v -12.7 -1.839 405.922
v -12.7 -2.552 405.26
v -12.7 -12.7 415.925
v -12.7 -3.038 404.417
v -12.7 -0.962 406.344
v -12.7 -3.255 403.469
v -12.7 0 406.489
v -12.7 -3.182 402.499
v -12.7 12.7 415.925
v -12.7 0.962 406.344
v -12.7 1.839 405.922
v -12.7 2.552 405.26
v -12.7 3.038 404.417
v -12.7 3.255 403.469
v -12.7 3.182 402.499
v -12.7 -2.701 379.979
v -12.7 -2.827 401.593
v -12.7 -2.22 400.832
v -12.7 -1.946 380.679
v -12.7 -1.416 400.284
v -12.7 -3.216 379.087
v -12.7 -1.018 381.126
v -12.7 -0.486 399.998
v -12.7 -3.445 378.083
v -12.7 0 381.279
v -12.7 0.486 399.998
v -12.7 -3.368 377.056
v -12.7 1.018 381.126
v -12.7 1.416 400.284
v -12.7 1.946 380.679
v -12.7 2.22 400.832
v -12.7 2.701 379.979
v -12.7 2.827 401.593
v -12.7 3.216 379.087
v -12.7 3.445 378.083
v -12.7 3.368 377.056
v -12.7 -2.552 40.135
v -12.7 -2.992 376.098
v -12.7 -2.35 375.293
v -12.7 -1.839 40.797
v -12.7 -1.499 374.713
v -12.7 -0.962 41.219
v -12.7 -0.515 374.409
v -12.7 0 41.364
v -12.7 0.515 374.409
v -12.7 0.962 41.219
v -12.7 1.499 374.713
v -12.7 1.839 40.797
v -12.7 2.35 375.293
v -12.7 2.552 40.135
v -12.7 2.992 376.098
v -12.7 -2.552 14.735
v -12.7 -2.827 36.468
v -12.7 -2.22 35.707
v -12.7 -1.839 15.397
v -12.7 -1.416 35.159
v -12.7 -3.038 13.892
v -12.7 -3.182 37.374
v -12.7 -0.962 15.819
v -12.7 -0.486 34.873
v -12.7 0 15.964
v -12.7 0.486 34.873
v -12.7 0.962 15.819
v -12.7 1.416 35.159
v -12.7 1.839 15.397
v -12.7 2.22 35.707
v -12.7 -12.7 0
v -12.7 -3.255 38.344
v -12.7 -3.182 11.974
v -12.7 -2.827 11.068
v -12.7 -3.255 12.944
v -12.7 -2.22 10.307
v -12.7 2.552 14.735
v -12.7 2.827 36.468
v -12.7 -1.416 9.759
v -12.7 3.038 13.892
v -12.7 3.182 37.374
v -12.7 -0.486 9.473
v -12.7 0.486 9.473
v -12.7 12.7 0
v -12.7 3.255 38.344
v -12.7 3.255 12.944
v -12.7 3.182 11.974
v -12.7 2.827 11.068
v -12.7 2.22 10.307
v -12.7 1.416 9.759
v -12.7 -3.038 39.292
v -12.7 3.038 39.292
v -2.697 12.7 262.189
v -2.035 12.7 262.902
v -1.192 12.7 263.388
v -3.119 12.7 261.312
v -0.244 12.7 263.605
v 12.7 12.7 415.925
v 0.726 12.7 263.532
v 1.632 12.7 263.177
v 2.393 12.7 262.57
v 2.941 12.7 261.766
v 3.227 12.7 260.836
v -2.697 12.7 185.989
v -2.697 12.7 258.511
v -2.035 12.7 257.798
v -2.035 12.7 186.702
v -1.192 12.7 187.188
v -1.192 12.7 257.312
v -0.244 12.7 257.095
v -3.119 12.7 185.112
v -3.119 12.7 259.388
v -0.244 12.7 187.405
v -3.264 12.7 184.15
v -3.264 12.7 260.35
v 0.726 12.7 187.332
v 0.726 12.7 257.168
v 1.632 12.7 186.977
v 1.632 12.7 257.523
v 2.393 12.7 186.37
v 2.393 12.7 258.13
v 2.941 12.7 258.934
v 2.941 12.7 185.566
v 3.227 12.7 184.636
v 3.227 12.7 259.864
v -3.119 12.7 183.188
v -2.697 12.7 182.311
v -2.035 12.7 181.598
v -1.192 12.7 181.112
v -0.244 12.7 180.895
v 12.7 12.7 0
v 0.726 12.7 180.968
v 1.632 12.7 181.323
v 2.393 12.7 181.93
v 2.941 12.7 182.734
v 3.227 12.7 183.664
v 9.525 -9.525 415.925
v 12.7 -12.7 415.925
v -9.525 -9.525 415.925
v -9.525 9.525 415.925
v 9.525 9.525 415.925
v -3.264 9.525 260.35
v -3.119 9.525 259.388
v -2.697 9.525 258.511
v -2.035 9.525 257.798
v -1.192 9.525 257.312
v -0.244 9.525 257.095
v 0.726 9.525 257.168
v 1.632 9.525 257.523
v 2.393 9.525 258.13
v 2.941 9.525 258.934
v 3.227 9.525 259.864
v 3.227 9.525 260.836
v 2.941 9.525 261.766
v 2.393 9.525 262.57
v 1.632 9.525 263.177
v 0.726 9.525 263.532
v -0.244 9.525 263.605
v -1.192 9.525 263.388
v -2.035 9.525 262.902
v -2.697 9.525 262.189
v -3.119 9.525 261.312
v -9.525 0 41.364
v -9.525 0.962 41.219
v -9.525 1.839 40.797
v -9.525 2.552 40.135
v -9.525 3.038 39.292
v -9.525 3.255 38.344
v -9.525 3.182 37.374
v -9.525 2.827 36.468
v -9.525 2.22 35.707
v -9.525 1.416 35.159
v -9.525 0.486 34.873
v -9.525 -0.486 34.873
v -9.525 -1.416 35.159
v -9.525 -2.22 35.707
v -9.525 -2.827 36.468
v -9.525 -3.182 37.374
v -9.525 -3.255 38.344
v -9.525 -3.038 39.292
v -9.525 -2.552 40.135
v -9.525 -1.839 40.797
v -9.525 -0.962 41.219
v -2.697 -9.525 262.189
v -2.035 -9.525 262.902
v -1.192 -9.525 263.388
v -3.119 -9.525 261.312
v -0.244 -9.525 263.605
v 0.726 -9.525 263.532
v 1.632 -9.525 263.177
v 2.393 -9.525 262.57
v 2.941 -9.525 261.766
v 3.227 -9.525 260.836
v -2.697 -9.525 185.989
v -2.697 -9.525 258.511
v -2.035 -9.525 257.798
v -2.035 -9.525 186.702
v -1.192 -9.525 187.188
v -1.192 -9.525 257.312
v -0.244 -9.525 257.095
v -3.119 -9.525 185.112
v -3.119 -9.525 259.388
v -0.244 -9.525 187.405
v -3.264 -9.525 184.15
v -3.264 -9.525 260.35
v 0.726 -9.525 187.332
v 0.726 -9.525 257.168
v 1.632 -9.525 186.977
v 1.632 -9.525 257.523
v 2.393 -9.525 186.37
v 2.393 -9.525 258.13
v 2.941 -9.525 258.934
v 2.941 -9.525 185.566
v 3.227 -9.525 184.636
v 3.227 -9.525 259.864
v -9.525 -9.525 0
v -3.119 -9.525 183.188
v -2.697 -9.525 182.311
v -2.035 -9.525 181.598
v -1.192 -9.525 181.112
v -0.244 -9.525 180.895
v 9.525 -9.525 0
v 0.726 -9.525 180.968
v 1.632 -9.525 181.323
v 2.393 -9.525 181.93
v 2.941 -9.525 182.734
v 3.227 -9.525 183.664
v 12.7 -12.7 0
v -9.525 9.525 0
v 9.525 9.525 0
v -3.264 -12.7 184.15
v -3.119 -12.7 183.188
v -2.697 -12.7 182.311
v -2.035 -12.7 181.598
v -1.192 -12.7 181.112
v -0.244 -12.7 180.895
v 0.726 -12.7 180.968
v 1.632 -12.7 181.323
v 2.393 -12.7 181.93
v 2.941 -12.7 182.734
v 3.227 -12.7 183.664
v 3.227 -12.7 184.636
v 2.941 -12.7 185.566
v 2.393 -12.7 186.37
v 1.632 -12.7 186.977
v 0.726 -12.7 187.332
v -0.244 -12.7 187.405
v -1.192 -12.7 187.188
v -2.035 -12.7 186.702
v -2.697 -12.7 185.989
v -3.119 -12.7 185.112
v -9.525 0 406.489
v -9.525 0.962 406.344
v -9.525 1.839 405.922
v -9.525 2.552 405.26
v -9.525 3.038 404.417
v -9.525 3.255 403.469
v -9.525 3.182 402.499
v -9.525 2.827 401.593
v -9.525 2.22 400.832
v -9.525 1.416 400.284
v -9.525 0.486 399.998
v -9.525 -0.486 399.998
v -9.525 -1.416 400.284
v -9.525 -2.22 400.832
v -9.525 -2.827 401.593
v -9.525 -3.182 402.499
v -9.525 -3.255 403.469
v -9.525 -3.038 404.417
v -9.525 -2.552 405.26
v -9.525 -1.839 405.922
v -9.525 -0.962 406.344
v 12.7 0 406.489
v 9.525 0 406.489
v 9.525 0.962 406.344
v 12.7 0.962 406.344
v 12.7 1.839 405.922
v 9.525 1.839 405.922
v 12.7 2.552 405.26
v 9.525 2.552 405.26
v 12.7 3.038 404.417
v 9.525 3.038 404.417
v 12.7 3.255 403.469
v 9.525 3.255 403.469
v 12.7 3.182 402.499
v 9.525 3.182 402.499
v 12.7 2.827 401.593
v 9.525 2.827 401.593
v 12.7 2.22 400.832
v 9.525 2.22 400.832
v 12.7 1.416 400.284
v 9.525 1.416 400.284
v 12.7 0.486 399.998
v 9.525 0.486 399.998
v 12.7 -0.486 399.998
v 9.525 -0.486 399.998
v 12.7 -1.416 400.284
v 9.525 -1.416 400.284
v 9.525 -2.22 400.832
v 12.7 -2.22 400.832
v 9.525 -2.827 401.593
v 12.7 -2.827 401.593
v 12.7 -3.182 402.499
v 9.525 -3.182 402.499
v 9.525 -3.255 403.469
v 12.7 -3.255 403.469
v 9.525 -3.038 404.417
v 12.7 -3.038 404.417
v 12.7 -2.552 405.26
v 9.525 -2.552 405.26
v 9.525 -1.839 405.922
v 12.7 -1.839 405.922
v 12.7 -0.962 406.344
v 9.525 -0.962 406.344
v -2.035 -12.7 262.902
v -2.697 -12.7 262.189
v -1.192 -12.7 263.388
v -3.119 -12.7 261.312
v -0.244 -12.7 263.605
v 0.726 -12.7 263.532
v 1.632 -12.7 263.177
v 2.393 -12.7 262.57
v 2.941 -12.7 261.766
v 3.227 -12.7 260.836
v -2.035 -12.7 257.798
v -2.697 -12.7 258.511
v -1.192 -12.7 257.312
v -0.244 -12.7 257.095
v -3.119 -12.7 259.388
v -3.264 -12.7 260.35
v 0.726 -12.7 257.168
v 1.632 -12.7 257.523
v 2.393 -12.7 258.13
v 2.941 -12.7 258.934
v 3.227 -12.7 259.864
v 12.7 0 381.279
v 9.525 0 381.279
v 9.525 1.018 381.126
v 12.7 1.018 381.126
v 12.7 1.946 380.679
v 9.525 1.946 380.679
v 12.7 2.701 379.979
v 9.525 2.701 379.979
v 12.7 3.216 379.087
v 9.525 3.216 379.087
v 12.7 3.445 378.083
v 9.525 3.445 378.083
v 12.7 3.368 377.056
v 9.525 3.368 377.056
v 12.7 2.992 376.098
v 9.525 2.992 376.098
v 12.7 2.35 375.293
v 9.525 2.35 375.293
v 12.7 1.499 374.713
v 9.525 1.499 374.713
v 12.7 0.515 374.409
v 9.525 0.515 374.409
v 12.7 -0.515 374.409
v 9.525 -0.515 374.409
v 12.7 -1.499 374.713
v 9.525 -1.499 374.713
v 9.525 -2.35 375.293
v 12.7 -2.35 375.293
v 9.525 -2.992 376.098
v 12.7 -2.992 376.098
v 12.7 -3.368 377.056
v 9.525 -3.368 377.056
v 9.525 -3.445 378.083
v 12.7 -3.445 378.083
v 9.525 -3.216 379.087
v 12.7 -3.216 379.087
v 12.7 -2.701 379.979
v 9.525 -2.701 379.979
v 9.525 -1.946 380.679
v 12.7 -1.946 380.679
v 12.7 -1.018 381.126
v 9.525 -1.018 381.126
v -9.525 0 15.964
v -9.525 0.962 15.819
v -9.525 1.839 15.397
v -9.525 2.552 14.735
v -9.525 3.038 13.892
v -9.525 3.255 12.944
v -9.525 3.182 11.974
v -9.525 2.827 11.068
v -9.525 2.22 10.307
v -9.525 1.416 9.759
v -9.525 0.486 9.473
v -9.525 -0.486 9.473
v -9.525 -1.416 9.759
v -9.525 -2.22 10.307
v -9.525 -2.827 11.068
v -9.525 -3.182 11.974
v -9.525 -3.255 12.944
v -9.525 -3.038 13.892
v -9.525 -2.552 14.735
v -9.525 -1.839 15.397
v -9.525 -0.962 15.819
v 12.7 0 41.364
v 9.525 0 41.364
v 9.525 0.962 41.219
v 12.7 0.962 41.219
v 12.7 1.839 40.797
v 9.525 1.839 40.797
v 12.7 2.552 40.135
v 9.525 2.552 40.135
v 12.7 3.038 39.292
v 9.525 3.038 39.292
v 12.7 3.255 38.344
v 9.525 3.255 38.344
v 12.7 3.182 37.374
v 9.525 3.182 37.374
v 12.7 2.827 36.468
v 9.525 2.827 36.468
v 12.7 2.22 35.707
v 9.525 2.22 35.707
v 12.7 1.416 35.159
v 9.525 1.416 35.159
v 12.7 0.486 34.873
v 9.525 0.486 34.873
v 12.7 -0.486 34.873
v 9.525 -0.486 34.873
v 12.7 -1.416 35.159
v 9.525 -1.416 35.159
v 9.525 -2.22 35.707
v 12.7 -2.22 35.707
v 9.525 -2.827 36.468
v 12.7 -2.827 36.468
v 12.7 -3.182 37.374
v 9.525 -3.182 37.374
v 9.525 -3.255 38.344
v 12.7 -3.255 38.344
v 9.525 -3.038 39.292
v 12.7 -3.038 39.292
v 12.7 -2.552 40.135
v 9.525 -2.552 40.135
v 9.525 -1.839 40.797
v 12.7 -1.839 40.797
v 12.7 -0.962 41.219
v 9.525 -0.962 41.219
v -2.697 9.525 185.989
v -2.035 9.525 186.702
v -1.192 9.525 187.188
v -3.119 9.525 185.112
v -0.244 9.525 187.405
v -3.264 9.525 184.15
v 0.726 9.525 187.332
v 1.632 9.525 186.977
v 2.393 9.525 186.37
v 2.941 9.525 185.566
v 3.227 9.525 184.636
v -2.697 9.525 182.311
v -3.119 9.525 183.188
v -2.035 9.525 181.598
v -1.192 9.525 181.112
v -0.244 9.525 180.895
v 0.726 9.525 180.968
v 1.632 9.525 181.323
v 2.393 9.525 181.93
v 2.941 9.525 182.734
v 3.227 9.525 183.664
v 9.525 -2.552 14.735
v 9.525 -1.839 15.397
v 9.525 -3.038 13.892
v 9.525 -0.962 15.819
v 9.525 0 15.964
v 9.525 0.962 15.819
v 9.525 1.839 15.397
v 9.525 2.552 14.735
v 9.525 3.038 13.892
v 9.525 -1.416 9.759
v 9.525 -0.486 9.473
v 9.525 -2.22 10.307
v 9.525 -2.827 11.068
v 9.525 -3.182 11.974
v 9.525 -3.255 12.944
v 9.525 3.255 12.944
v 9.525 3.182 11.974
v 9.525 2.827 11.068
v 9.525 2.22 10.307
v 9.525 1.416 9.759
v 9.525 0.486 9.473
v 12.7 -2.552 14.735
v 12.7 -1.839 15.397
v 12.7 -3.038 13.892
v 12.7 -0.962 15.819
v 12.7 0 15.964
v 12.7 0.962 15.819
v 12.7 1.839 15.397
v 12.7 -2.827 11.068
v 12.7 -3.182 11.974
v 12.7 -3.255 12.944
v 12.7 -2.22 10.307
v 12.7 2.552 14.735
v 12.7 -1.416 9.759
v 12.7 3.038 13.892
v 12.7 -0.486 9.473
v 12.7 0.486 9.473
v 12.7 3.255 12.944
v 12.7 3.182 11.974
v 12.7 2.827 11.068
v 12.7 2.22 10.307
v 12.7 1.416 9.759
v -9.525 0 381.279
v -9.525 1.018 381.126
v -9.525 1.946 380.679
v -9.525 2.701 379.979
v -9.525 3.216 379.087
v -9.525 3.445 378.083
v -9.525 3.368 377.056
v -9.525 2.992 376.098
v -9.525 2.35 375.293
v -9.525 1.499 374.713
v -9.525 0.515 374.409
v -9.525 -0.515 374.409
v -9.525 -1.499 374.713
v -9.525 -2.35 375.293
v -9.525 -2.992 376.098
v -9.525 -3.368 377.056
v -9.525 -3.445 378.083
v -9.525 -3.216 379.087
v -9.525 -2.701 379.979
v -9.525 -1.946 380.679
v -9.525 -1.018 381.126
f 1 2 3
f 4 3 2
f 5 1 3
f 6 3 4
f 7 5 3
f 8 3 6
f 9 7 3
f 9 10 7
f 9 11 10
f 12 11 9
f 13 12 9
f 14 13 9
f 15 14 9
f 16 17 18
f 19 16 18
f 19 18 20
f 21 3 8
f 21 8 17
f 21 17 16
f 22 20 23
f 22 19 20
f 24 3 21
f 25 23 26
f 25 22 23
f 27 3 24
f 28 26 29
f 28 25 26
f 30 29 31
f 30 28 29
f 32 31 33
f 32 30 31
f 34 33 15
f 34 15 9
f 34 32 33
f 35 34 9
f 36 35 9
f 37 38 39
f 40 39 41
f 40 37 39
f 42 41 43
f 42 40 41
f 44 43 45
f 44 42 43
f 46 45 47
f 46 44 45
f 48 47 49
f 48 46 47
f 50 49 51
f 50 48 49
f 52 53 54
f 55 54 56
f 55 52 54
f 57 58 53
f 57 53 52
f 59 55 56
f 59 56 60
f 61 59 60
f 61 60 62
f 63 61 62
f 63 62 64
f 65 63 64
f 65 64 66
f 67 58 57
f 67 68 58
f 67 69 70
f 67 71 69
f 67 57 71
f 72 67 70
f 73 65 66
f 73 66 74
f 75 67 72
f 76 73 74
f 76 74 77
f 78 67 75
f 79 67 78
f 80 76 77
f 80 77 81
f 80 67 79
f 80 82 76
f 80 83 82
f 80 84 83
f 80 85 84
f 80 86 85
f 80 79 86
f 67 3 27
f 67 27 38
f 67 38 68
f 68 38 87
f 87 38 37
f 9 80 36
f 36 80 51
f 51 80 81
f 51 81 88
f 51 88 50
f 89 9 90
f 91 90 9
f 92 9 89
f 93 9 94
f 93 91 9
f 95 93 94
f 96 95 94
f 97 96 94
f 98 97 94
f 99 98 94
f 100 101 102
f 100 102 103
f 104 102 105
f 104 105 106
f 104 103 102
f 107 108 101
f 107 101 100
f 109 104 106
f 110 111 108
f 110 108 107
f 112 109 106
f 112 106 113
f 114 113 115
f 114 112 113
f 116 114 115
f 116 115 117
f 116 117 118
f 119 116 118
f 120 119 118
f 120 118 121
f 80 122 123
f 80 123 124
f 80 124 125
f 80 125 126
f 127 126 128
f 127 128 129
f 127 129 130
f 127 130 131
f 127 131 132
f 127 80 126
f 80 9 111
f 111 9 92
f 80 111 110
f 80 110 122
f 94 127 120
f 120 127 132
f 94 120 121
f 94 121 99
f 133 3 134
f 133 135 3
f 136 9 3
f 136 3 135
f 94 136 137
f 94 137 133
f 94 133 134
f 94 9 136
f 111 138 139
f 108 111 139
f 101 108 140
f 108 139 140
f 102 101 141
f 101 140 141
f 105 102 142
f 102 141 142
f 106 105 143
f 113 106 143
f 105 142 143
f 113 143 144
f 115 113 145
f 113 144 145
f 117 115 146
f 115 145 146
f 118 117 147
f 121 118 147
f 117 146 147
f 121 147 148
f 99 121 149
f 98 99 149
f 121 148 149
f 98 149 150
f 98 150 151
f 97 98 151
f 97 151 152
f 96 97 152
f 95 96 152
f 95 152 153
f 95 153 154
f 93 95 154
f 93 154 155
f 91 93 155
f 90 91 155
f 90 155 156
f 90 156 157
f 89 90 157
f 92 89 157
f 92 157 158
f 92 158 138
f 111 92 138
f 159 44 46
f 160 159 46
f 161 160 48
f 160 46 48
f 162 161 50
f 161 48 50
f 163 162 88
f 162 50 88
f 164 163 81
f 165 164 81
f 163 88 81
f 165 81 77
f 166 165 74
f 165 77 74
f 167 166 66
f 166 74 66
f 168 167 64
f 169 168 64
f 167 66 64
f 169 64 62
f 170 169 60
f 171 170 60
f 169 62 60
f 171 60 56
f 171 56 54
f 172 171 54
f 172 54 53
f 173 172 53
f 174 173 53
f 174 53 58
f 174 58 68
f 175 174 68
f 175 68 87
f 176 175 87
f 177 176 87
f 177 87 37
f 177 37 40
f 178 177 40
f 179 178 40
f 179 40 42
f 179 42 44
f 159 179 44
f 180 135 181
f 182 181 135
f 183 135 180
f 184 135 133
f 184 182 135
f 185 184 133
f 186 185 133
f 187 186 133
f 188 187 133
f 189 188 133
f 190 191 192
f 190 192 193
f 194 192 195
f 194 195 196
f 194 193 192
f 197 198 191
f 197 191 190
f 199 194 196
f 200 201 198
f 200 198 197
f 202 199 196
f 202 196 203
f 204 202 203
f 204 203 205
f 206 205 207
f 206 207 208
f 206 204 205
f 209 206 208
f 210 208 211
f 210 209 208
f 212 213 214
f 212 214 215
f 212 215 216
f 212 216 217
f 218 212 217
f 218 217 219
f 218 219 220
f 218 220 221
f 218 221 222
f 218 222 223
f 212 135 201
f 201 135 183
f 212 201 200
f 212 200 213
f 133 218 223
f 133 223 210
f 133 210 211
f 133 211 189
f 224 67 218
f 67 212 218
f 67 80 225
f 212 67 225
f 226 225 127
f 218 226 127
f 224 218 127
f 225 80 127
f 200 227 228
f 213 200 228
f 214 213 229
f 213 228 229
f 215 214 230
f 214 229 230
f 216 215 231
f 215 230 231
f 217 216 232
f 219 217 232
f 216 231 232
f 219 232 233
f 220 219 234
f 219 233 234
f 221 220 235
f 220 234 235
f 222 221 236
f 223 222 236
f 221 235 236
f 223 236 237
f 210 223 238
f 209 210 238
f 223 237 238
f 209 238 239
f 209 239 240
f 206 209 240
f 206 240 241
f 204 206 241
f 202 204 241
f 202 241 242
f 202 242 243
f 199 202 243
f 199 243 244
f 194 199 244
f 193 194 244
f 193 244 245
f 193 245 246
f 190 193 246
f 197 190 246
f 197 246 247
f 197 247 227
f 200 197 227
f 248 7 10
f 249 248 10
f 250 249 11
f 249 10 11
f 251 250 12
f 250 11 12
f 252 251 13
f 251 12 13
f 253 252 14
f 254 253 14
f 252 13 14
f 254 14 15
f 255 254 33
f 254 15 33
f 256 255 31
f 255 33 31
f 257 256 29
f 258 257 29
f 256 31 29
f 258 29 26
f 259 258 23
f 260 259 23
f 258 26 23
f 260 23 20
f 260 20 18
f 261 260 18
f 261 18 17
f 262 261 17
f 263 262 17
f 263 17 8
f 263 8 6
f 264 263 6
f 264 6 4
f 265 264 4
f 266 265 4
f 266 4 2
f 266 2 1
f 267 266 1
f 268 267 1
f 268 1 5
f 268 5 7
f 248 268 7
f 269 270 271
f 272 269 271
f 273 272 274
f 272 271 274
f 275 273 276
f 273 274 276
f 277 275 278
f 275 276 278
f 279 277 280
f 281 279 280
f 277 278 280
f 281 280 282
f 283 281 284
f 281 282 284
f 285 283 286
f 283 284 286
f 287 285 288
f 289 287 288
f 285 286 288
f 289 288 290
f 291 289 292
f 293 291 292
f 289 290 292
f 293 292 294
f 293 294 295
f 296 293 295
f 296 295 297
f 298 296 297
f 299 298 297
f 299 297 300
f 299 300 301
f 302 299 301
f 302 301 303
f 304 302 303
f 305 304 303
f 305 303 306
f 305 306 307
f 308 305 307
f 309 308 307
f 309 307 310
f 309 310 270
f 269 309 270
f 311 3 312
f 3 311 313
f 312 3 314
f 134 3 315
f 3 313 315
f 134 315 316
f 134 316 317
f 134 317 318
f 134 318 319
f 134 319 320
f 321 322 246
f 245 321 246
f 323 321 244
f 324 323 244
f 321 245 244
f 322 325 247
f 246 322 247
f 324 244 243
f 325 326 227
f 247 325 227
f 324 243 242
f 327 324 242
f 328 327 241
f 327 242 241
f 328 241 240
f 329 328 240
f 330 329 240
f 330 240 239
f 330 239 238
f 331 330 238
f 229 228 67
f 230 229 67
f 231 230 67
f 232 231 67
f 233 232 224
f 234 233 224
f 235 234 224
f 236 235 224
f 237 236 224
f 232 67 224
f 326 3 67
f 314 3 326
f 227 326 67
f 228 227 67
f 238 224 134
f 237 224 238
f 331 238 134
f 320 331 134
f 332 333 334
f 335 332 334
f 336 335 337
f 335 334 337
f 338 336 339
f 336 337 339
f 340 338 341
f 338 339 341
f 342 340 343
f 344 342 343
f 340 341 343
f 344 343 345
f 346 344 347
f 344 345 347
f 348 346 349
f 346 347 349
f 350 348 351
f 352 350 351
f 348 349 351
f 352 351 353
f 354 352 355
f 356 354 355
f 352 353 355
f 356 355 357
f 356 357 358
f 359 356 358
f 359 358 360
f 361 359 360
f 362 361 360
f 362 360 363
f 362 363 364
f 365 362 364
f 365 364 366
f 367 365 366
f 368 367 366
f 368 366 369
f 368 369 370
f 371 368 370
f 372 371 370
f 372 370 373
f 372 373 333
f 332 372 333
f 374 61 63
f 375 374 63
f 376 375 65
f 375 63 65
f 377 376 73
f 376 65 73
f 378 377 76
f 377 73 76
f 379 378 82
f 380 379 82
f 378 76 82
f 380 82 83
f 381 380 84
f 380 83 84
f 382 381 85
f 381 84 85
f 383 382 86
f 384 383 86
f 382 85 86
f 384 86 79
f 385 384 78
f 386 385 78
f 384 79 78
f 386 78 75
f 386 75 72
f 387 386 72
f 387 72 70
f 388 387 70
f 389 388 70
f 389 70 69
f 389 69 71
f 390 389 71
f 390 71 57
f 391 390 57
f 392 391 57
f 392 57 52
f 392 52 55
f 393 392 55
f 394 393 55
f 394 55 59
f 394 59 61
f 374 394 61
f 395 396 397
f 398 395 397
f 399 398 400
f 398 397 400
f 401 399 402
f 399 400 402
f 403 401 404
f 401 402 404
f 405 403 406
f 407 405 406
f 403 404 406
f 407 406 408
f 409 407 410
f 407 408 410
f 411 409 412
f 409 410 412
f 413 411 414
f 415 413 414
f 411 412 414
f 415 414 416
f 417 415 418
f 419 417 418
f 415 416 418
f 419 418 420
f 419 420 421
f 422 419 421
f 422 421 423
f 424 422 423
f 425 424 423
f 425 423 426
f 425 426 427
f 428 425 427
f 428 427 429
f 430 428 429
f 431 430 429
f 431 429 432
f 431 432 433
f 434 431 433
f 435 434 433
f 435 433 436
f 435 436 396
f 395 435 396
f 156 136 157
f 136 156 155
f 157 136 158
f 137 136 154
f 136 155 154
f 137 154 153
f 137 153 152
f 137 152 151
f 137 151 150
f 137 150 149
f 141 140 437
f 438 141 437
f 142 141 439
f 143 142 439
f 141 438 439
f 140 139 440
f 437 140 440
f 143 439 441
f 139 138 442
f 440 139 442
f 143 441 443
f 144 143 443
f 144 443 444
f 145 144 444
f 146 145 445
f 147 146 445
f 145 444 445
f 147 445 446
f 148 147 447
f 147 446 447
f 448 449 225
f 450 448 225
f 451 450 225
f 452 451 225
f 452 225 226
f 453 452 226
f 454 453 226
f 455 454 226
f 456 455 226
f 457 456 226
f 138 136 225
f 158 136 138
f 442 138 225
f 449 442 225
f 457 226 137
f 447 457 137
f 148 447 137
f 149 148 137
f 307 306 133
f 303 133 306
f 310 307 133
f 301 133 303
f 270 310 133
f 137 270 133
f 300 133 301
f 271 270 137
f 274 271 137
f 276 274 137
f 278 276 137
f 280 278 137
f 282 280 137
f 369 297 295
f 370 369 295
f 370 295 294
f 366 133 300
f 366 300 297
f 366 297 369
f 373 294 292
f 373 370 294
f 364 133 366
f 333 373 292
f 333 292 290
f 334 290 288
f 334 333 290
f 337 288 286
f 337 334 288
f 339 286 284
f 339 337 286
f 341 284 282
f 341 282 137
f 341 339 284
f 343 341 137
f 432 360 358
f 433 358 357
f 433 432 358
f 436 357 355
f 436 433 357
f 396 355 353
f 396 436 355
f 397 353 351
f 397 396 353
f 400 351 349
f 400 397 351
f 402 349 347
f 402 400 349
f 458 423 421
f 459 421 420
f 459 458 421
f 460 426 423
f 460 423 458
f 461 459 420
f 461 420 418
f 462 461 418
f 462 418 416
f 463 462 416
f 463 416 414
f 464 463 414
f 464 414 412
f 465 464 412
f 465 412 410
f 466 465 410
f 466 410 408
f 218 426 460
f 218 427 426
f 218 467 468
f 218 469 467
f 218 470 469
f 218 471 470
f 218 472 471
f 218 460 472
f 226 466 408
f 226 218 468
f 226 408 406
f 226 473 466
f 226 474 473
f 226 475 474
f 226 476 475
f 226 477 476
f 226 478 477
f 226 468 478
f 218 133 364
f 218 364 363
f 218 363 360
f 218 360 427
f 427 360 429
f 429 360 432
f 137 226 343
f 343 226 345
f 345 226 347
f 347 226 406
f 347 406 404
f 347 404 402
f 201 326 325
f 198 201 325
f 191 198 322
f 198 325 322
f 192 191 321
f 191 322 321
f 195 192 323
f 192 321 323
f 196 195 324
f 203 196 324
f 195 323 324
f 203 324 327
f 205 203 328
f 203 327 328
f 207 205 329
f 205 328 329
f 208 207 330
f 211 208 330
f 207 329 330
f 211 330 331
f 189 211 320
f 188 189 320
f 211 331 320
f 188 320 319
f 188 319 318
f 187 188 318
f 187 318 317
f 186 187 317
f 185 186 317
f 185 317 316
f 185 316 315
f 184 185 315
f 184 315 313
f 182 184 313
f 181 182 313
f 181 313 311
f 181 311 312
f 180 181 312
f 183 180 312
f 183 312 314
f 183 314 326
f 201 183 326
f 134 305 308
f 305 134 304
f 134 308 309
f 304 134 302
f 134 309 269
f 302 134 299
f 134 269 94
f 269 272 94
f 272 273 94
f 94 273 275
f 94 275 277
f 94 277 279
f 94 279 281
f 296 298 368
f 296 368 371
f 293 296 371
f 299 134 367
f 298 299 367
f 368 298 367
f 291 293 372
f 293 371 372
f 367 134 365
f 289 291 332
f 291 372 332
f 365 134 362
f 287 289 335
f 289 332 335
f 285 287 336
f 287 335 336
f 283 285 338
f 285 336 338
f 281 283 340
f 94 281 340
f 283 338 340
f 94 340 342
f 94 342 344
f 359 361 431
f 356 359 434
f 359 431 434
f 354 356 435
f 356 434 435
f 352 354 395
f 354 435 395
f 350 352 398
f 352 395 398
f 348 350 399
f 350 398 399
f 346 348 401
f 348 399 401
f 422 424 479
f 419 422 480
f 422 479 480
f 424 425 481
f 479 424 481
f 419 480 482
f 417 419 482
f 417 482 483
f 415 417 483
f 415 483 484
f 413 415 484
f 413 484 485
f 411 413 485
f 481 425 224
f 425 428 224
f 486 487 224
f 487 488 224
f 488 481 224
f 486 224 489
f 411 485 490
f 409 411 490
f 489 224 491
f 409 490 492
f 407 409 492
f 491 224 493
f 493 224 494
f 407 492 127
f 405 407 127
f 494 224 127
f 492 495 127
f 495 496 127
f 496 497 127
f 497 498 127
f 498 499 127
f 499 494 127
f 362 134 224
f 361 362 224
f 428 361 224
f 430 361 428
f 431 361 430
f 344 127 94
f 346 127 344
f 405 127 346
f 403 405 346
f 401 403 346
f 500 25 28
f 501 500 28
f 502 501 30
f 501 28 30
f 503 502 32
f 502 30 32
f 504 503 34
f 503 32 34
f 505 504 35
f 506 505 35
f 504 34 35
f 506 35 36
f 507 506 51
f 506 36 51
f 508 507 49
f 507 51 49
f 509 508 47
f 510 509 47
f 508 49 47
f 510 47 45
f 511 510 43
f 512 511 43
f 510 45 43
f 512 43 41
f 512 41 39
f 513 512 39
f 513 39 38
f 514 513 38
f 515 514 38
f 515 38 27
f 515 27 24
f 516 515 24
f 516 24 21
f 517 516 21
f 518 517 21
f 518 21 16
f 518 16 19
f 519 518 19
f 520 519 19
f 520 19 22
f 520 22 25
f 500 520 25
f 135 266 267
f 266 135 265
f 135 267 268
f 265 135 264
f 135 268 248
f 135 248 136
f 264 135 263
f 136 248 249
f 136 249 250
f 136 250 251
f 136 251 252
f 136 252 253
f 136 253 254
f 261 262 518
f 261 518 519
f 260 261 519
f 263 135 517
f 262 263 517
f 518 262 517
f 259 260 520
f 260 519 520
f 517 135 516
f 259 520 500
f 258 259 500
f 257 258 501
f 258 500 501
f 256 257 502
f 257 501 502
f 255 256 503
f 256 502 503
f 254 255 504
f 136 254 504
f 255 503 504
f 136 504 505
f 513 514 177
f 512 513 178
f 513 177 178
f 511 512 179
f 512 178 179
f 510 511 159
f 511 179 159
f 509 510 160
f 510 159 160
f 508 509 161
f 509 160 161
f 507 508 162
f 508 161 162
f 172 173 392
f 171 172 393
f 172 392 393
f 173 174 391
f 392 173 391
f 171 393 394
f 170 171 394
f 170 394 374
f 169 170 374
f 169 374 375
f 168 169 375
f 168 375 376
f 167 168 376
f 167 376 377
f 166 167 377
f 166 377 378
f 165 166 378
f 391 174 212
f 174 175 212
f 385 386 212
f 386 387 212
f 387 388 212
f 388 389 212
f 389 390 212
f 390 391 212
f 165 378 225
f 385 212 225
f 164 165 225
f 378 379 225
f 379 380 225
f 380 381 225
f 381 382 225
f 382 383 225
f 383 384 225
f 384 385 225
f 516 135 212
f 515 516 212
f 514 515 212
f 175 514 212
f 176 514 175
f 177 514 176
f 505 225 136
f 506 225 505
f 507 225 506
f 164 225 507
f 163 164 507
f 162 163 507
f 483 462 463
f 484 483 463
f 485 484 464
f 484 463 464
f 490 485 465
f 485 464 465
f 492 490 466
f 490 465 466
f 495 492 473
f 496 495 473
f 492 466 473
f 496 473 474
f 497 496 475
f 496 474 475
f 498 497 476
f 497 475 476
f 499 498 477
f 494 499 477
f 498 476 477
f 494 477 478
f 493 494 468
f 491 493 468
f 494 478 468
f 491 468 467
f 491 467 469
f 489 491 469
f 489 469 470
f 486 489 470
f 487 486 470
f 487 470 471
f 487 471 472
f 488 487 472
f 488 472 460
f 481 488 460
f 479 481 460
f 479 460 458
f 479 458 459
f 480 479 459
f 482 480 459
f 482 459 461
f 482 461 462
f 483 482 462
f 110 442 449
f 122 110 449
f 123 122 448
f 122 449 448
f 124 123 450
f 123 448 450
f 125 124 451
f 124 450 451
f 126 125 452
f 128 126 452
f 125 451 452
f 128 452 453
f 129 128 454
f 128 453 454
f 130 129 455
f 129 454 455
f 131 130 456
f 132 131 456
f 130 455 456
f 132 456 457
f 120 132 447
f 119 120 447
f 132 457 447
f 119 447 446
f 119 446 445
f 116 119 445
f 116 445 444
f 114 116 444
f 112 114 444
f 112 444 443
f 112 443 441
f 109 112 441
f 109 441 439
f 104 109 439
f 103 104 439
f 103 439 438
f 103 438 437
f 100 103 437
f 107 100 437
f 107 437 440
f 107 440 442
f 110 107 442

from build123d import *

# Parameters (mm, degrees)
SKETCH1_W                = 25.4
SKETCH1_H                = 25.4
SKETCH1_W_2              = 19.05
SKETCH1_H_2              = 19.05
BOSS_EXTRUDE1_DEPTH      = 415.925
F_0_257_DIAMETER_HOLE1_D = 6.5278
I_0_272_DIAMETER_HOLE1_D = 6.9088
F_0_257_DIAMETER_HOLE2_D = 6.5278


with BuildPart() as part:
    # Sketch1 → Boss-Extrude1 (new body)
    with BuildSketch(Plane.XY):
        Rectangle(SKETCH1_W, SKETCH1_H)
        Rectangle(SKETCH1_W_2, SKETCH1_H_2, mode=Mode.SUBTRACT)
    extrude(amount=BOSS_EXTRUDE1_DEPTH)

    # F (0.257) Diameter Hole1 (through all)
    with Locations(Plane(origin=(12.7, 0, 0), x_dir=(0, 0, -1), z_dir=(1, 0, 0))):
        with Locations((-403.225, 0), (-12.7, 0), (-38.1, 0)):
            Hole(F_0_257_DIAMETER_HOLE1_D / 2)

    # I (0.272) Diameter Hole1 (through all)
    with Locations(Plane(origin=(12.7, 0, 0), x_dir=(0, 0, -1), z_dir=(1, 0, 0))):
        with Locations((-377.825, 0)):
            Hole(I_0_272_DIAMETER_HOLE1_D / 2)

    # F (0.257) Diameter Hole2 (through all)
    with Locations(Plane(origin=(0, 12.7, 0), x_dir=(1, 0, 0), z_dir=(0, 1, 0))):
        with Locations((0, -184.15), (0, -260.35)):
            Hole(F_0_257_DIAMETER_HOLE2_D / 2)


solid = part.part
